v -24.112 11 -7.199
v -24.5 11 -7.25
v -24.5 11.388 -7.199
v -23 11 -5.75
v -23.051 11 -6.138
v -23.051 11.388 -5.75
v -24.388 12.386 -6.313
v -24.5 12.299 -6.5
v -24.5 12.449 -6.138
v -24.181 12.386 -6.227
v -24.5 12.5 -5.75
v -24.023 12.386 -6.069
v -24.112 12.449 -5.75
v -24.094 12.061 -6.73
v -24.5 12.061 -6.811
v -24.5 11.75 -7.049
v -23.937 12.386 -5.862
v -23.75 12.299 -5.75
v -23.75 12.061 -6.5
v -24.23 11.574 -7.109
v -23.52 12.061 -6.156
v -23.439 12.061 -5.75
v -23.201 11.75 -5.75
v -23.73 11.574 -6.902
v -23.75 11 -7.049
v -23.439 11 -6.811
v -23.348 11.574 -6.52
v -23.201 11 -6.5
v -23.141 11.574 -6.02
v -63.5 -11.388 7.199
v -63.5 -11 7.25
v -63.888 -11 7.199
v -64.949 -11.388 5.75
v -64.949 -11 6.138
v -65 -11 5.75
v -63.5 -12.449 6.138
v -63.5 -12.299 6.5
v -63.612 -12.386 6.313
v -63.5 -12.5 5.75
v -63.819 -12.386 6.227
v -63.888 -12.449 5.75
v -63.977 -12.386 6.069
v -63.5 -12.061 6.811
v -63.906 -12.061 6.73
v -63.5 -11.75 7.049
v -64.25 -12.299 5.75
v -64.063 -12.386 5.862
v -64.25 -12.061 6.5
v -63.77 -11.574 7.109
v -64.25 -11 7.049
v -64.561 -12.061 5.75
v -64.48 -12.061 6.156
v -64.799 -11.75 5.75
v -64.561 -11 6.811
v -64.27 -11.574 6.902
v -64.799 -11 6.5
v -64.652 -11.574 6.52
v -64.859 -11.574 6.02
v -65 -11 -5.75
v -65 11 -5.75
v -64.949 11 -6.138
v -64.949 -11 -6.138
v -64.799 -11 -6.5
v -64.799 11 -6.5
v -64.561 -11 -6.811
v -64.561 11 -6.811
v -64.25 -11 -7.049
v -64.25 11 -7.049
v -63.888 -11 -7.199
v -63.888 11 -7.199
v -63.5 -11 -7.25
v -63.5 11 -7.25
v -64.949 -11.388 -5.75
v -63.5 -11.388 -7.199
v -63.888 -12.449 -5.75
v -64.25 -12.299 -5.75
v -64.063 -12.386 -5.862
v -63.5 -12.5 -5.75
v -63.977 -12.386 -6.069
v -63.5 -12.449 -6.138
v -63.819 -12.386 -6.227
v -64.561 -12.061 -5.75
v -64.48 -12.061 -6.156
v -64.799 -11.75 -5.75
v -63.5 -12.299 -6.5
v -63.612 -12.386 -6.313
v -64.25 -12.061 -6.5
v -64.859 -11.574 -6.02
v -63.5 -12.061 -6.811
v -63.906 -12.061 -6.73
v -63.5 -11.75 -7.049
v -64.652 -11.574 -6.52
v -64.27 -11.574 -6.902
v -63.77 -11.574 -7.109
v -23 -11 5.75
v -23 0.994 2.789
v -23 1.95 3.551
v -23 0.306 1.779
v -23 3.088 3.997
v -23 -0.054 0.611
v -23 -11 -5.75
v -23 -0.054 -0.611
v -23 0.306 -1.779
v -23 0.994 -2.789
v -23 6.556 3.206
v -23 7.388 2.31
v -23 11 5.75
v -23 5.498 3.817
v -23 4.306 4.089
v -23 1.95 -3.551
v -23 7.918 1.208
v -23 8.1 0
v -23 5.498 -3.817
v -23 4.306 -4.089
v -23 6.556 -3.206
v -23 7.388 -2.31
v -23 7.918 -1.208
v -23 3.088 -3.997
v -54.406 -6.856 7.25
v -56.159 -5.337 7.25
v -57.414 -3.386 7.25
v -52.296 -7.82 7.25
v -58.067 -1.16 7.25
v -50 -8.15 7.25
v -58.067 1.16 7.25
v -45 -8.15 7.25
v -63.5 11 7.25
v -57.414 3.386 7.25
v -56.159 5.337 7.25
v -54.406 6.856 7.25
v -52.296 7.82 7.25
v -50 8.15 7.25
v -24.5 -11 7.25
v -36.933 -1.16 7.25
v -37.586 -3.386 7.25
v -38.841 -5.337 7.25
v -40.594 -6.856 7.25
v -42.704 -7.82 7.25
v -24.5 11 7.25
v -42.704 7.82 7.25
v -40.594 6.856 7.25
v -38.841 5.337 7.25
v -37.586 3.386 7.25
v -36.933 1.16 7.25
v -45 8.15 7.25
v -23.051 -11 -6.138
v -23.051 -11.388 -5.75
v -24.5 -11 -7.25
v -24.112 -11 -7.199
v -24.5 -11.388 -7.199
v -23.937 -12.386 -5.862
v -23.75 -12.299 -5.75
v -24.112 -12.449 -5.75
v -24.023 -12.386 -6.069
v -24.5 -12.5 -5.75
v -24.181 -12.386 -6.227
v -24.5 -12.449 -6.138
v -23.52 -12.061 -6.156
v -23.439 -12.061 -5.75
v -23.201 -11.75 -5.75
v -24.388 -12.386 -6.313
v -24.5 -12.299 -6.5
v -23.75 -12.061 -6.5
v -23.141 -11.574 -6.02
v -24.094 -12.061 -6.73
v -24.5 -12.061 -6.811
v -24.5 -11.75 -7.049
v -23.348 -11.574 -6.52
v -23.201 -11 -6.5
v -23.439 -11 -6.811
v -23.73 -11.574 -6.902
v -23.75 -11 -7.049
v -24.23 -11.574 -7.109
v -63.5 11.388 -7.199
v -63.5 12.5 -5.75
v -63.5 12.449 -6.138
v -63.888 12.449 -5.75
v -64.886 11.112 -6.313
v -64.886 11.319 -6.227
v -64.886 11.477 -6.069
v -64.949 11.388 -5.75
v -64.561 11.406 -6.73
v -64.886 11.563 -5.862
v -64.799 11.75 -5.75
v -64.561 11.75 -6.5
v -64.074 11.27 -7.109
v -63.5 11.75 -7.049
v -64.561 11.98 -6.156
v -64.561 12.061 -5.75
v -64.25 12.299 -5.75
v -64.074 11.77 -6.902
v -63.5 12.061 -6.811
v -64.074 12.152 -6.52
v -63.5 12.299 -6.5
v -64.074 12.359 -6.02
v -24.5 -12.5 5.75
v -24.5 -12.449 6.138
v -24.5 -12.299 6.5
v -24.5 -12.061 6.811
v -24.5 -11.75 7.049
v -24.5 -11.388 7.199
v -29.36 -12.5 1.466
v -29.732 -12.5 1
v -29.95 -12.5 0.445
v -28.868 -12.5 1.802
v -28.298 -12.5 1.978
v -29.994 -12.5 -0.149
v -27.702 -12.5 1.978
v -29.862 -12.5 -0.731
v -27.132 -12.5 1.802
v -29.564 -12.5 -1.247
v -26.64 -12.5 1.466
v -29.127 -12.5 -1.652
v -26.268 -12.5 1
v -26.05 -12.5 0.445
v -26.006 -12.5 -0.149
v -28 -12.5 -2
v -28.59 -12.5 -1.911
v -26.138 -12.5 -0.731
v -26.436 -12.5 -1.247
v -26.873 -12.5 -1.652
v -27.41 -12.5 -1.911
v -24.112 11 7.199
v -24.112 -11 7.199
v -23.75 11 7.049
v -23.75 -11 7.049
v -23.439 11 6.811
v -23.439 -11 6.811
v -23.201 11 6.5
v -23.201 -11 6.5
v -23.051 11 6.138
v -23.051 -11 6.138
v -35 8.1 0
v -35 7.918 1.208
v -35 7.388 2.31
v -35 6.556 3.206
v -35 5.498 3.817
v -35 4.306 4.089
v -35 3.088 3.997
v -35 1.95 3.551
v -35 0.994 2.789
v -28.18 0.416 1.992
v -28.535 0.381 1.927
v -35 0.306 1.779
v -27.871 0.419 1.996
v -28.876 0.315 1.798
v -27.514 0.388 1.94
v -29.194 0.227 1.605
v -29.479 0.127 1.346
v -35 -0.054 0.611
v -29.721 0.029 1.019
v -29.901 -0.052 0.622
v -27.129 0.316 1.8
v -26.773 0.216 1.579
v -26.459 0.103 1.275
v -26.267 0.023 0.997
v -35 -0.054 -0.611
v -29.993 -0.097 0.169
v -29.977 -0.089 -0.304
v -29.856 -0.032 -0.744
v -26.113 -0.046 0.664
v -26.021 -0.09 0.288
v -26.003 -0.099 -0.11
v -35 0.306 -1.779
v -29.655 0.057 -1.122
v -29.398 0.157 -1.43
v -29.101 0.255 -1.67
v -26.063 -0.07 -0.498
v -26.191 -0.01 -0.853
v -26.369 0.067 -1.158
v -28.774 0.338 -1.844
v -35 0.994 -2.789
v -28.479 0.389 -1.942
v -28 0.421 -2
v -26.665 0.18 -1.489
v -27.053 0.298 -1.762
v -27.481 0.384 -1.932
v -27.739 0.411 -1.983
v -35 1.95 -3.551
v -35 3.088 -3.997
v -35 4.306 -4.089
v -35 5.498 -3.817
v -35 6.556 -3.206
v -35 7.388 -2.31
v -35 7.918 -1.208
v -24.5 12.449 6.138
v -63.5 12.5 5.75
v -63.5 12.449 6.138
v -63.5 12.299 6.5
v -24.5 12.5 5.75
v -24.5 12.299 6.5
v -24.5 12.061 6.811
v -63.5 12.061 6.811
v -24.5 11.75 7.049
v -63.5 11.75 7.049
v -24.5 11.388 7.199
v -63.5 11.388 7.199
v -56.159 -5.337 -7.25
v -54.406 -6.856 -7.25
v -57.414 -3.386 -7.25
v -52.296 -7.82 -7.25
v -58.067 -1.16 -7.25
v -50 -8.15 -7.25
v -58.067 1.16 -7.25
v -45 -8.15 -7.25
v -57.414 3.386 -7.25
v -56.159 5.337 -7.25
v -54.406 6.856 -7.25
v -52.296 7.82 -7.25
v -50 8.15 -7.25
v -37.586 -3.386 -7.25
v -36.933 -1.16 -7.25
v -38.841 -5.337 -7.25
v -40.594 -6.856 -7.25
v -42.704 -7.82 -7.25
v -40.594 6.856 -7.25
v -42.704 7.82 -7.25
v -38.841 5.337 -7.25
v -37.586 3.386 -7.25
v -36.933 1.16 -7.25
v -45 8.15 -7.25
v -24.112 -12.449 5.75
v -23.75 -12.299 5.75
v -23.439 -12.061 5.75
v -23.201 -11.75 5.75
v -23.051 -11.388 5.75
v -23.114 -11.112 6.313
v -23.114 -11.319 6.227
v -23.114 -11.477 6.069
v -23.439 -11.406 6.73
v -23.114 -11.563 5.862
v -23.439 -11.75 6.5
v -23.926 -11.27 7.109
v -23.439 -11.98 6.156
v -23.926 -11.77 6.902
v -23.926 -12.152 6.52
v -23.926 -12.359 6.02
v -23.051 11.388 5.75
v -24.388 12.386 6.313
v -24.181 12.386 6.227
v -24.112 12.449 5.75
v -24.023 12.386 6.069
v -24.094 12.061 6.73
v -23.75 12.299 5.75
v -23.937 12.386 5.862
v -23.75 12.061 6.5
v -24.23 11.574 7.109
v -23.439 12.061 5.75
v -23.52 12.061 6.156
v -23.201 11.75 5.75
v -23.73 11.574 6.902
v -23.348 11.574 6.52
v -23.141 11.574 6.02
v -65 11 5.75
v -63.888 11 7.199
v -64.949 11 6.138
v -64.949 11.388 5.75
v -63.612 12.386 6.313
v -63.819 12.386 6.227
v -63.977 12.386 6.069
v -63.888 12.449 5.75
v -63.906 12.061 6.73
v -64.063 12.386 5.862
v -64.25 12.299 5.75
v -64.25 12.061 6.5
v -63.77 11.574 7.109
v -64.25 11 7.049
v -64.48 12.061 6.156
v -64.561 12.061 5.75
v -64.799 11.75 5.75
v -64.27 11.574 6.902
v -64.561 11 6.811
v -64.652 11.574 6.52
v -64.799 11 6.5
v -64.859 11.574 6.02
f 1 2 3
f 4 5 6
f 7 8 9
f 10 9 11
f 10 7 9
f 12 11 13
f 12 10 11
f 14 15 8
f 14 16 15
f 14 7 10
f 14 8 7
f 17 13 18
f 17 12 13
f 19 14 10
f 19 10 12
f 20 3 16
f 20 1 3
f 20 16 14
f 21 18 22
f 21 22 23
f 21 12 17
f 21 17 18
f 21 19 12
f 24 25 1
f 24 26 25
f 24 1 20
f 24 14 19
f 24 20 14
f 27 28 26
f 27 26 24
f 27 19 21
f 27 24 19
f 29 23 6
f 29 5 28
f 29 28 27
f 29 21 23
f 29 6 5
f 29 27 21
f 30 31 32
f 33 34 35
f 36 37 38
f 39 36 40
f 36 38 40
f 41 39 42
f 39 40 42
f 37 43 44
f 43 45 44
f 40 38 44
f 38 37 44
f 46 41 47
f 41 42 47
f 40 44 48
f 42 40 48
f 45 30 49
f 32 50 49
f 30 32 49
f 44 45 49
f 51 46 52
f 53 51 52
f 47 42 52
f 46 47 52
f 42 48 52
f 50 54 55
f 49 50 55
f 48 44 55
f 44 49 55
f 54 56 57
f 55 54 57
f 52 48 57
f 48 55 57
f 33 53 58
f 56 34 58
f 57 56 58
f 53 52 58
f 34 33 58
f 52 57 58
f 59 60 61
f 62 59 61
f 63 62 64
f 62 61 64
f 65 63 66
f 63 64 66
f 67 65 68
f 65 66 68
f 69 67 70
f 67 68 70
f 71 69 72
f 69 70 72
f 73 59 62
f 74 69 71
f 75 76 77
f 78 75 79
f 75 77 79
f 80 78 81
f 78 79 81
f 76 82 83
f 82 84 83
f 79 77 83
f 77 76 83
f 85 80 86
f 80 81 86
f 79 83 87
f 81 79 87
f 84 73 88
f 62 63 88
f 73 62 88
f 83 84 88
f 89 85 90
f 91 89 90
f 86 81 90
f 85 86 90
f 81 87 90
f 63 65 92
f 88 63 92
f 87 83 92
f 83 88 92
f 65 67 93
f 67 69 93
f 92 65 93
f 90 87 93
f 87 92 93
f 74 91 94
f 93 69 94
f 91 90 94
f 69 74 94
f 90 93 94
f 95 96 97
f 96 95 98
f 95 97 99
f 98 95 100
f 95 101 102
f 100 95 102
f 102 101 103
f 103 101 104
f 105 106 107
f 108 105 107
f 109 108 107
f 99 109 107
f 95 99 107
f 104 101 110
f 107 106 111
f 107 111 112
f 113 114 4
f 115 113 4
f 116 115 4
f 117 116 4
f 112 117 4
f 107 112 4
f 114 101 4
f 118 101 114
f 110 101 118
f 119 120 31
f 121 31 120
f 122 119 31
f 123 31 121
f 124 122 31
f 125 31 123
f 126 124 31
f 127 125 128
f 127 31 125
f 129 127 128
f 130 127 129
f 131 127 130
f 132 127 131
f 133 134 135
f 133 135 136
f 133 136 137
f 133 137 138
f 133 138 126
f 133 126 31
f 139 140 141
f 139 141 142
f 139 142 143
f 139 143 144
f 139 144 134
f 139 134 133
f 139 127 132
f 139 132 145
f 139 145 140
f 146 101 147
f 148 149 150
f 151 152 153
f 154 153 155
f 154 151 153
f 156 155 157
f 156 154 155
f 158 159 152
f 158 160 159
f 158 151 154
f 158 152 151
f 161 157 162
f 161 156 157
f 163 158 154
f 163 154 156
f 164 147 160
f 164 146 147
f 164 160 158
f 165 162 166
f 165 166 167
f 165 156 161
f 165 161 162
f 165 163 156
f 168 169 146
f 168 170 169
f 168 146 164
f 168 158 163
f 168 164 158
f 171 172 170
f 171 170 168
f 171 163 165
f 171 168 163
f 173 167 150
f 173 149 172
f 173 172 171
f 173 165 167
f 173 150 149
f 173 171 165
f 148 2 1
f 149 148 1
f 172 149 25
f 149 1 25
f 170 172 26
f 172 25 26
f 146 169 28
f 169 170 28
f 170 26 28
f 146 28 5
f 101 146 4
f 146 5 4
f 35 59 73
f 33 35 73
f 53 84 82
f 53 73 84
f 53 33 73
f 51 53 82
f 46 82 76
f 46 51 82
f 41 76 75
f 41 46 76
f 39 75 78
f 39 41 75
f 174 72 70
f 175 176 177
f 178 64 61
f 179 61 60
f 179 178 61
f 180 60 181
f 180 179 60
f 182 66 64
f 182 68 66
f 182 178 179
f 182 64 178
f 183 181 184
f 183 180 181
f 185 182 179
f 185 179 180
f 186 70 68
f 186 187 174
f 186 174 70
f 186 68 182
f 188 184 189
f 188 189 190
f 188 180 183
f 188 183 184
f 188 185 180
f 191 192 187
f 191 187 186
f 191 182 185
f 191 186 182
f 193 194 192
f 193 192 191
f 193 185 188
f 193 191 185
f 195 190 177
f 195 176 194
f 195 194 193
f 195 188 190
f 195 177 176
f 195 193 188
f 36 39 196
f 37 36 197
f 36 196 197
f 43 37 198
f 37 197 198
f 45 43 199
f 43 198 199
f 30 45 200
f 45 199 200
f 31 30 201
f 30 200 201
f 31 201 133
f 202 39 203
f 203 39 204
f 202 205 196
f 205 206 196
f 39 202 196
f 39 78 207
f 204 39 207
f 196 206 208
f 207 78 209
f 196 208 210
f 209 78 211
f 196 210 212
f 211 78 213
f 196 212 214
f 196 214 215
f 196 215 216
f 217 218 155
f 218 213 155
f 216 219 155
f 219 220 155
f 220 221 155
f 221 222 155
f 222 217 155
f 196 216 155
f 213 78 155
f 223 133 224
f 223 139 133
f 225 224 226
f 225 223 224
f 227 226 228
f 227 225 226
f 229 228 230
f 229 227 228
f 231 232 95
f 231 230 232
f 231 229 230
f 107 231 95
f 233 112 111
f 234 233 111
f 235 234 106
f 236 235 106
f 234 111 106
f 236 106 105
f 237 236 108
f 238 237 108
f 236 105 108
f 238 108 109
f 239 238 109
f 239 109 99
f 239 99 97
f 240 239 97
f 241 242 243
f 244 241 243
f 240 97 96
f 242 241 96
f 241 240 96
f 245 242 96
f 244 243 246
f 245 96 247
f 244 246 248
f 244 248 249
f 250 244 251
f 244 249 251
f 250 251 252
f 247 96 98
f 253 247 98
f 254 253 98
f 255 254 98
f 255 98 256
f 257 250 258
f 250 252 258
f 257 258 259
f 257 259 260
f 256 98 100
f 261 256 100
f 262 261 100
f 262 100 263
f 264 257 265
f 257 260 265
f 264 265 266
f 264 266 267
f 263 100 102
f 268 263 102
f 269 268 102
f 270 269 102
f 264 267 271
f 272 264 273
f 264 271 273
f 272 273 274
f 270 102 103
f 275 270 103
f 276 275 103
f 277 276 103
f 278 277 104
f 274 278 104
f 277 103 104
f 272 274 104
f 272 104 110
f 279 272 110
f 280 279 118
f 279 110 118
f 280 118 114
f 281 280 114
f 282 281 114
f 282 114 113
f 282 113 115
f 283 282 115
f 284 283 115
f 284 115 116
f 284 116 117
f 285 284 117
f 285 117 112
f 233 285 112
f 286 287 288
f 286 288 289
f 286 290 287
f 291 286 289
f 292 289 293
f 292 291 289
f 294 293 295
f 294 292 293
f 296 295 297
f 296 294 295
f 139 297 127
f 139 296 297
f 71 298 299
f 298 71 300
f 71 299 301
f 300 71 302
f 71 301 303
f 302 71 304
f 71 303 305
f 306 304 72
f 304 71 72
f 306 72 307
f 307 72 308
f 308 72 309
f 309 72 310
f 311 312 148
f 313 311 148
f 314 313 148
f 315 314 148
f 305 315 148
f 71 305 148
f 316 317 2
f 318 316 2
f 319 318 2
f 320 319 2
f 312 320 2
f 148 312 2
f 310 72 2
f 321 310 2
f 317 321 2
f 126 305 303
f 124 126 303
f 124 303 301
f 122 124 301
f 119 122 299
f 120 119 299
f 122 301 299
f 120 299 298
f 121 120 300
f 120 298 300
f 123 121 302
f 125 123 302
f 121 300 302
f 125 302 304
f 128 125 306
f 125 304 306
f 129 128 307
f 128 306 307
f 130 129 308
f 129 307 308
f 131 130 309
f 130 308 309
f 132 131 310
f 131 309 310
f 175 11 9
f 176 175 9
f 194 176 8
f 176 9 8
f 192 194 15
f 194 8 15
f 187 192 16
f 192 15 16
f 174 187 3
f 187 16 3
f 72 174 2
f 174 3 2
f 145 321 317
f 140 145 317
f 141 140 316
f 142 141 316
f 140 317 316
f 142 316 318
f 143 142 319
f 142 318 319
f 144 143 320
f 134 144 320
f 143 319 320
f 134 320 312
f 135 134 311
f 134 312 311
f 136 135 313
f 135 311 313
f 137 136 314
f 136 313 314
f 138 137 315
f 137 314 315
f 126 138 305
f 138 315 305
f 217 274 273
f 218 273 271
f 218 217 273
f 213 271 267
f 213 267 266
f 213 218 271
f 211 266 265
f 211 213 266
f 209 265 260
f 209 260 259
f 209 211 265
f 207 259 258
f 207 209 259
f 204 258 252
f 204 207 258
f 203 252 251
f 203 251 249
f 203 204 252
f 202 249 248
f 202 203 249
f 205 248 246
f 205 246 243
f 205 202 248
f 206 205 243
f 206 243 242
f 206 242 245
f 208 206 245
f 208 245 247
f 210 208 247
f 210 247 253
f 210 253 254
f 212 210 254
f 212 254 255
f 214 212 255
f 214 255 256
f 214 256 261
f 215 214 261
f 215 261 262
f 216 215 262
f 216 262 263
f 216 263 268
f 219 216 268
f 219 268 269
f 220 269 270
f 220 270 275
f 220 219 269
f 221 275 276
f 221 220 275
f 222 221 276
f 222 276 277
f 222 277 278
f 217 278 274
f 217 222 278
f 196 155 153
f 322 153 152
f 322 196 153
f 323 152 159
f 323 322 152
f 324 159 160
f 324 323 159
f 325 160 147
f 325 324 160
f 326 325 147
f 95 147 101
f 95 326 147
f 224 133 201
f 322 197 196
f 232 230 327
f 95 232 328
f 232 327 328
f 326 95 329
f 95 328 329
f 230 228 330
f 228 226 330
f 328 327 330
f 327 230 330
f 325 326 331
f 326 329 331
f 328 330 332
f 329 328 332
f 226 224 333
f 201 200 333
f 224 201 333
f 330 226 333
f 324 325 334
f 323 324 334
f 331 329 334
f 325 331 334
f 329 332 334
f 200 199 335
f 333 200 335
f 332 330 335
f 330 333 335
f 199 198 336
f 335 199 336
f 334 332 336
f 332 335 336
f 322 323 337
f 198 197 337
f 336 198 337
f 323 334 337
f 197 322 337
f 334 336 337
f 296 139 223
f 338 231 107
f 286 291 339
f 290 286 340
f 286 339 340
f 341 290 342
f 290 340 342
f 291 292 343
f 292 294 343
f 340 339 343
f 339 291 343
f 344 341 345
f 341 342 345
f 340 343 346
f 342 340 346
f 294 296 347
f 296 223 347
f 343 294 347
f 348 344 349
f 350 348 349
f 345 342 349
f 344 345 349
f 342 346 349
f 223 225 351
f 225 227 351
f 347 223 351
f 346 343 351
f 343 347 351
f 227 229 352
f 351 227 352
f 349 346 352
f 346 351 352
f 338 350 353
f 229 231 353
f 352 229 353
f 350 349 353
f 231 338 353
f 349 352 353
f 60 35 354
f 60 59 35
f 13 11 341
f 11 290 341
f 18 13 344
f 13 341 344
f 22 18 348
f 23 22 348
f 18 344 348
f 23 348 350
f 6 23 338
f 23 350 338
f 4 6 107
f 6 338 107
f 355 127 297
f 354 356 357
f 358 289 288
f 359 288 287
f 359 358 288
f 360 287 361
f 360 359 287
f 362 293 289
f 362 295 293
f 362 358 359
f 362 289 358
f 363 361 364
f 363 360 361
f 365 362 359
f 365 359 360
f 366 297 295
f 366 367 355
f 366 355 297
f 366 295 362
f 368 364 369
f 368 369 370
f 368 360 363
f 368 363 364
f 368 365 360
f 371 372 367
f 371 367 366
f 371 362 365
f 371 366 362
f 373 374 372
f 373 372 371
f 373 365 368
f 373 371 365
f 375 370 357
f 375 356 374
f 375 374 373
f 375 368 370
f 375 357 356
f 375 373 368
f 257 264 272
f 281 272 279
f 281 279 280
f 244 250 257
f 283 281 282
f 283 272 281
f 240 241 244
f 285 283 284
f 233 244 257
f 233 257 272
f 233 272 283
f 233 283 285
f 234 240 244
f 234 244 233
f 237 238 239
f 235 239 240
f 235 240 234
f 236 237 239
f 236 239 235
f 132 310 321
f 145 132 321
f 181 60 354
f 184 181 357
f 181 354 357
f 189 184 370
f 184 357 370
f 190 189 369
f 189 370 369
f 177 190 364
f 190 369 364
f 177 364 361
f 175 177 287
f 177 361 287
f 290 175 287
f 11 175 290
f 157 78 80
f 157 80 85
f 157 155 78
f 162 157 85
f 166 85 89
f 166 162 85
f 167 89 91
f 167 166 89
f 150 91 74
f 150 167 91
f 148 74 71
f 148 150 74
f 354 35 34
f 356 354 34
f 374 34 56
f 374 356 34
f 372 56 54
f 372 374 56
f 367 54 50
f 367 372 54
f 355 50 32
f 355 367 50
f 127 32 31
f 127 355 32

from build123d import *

# Parameters (mm, degrees)
BOSS_EXTRUDE1_DEPTH      = 7.25
BOSS_EXTRUDE1_DEPTH_BACK = 7.25
SKETCH1_W                = 42
SKETCH1_H                = 25
SKETCH2_R                = 4.1
CUT_EXTRUDE1_DEPTH       = 12
SKETCH3_R                = 2
CUT_EXTRUDE5_DEPTH       = 15
FILLET3_R                = 1.5


with BuildPart() as part:
    # Sketch1 → Boss-Extrude1 (new, two sides: drawn at the far end of the back side and taken through both)
    with BuildSketch(Plane.XY.offset(-BOSS_EXTRUDE1_DEPTH_BACK)):
        with Locations((-44, 0)):
            Rectangle(SKETCH1_W, SKETCH1_H)
        with BuildLine():
            Line((-45, -8.15), (-50, -8.15))
            ThreePointArc((-50, -8.15), (-58.15, 0), (-50, 8.15))
            Line((-50, 8.15), (-45, 8.15))
            ThreePointArc((-45, 8.15), (-36.85, 0), (-45, -8.15))
        make_face(mode=Mode.SUBTRACT)
    extrude(amount=BOSS_EXTRUDE1_DEPTH + BOSS_EXTRUDE1_DEPTH_BACK)

    # Sketch2 → Cut-Extrude1 (cut)
    with BuildSketch(Plane(origin=(-23, 0, 0), x_dir=(0, 0, -1), z_dir=(1, 0, 0))):
        with Locations((0, 4)):
            Circle(SKETCH2_R)
    extrude(amount=-CUT_EXTRUDE1_DEPTH, mode=Mode.SUBTRACT)

    # Sketch3 → Cut-Extrude5 (cut)
    with BuildSketch(Plane(origin=(0, -12.5, 0), x_dir=(1, 0, 0), z_dir=(0, 1, 0))):
        with Locations((-28, 0)):
            Circle(SKETCH3_R)
    extrude(amount=CUT_EXTRUDE5_DEPTH, mode=Mode.SUBTRACT)

    # Fillet3
    fillet3_edges = [part.edges().sort_by_distance(p)[0] for p in [
        (-65, 0, -7.25),
        (-65, 12.5, 0),
        (-65, 0, 7.25),
        (-65, -12.5, 0),
        (-23, 0, 7.25),
        (-23, 0, -7.25),
        (-44, -12.5, -7.25),
        (-44, -12.5, 7.25),
        (-44, 12.5, 7.25),
        (-23, -12.5, 0),
        (-23, 12.5, 0),
        (-44, 12.5, -7.25),
    ]]
    fillet(fillet3_edges, radius=FILLET3_R)


solid = part.part
